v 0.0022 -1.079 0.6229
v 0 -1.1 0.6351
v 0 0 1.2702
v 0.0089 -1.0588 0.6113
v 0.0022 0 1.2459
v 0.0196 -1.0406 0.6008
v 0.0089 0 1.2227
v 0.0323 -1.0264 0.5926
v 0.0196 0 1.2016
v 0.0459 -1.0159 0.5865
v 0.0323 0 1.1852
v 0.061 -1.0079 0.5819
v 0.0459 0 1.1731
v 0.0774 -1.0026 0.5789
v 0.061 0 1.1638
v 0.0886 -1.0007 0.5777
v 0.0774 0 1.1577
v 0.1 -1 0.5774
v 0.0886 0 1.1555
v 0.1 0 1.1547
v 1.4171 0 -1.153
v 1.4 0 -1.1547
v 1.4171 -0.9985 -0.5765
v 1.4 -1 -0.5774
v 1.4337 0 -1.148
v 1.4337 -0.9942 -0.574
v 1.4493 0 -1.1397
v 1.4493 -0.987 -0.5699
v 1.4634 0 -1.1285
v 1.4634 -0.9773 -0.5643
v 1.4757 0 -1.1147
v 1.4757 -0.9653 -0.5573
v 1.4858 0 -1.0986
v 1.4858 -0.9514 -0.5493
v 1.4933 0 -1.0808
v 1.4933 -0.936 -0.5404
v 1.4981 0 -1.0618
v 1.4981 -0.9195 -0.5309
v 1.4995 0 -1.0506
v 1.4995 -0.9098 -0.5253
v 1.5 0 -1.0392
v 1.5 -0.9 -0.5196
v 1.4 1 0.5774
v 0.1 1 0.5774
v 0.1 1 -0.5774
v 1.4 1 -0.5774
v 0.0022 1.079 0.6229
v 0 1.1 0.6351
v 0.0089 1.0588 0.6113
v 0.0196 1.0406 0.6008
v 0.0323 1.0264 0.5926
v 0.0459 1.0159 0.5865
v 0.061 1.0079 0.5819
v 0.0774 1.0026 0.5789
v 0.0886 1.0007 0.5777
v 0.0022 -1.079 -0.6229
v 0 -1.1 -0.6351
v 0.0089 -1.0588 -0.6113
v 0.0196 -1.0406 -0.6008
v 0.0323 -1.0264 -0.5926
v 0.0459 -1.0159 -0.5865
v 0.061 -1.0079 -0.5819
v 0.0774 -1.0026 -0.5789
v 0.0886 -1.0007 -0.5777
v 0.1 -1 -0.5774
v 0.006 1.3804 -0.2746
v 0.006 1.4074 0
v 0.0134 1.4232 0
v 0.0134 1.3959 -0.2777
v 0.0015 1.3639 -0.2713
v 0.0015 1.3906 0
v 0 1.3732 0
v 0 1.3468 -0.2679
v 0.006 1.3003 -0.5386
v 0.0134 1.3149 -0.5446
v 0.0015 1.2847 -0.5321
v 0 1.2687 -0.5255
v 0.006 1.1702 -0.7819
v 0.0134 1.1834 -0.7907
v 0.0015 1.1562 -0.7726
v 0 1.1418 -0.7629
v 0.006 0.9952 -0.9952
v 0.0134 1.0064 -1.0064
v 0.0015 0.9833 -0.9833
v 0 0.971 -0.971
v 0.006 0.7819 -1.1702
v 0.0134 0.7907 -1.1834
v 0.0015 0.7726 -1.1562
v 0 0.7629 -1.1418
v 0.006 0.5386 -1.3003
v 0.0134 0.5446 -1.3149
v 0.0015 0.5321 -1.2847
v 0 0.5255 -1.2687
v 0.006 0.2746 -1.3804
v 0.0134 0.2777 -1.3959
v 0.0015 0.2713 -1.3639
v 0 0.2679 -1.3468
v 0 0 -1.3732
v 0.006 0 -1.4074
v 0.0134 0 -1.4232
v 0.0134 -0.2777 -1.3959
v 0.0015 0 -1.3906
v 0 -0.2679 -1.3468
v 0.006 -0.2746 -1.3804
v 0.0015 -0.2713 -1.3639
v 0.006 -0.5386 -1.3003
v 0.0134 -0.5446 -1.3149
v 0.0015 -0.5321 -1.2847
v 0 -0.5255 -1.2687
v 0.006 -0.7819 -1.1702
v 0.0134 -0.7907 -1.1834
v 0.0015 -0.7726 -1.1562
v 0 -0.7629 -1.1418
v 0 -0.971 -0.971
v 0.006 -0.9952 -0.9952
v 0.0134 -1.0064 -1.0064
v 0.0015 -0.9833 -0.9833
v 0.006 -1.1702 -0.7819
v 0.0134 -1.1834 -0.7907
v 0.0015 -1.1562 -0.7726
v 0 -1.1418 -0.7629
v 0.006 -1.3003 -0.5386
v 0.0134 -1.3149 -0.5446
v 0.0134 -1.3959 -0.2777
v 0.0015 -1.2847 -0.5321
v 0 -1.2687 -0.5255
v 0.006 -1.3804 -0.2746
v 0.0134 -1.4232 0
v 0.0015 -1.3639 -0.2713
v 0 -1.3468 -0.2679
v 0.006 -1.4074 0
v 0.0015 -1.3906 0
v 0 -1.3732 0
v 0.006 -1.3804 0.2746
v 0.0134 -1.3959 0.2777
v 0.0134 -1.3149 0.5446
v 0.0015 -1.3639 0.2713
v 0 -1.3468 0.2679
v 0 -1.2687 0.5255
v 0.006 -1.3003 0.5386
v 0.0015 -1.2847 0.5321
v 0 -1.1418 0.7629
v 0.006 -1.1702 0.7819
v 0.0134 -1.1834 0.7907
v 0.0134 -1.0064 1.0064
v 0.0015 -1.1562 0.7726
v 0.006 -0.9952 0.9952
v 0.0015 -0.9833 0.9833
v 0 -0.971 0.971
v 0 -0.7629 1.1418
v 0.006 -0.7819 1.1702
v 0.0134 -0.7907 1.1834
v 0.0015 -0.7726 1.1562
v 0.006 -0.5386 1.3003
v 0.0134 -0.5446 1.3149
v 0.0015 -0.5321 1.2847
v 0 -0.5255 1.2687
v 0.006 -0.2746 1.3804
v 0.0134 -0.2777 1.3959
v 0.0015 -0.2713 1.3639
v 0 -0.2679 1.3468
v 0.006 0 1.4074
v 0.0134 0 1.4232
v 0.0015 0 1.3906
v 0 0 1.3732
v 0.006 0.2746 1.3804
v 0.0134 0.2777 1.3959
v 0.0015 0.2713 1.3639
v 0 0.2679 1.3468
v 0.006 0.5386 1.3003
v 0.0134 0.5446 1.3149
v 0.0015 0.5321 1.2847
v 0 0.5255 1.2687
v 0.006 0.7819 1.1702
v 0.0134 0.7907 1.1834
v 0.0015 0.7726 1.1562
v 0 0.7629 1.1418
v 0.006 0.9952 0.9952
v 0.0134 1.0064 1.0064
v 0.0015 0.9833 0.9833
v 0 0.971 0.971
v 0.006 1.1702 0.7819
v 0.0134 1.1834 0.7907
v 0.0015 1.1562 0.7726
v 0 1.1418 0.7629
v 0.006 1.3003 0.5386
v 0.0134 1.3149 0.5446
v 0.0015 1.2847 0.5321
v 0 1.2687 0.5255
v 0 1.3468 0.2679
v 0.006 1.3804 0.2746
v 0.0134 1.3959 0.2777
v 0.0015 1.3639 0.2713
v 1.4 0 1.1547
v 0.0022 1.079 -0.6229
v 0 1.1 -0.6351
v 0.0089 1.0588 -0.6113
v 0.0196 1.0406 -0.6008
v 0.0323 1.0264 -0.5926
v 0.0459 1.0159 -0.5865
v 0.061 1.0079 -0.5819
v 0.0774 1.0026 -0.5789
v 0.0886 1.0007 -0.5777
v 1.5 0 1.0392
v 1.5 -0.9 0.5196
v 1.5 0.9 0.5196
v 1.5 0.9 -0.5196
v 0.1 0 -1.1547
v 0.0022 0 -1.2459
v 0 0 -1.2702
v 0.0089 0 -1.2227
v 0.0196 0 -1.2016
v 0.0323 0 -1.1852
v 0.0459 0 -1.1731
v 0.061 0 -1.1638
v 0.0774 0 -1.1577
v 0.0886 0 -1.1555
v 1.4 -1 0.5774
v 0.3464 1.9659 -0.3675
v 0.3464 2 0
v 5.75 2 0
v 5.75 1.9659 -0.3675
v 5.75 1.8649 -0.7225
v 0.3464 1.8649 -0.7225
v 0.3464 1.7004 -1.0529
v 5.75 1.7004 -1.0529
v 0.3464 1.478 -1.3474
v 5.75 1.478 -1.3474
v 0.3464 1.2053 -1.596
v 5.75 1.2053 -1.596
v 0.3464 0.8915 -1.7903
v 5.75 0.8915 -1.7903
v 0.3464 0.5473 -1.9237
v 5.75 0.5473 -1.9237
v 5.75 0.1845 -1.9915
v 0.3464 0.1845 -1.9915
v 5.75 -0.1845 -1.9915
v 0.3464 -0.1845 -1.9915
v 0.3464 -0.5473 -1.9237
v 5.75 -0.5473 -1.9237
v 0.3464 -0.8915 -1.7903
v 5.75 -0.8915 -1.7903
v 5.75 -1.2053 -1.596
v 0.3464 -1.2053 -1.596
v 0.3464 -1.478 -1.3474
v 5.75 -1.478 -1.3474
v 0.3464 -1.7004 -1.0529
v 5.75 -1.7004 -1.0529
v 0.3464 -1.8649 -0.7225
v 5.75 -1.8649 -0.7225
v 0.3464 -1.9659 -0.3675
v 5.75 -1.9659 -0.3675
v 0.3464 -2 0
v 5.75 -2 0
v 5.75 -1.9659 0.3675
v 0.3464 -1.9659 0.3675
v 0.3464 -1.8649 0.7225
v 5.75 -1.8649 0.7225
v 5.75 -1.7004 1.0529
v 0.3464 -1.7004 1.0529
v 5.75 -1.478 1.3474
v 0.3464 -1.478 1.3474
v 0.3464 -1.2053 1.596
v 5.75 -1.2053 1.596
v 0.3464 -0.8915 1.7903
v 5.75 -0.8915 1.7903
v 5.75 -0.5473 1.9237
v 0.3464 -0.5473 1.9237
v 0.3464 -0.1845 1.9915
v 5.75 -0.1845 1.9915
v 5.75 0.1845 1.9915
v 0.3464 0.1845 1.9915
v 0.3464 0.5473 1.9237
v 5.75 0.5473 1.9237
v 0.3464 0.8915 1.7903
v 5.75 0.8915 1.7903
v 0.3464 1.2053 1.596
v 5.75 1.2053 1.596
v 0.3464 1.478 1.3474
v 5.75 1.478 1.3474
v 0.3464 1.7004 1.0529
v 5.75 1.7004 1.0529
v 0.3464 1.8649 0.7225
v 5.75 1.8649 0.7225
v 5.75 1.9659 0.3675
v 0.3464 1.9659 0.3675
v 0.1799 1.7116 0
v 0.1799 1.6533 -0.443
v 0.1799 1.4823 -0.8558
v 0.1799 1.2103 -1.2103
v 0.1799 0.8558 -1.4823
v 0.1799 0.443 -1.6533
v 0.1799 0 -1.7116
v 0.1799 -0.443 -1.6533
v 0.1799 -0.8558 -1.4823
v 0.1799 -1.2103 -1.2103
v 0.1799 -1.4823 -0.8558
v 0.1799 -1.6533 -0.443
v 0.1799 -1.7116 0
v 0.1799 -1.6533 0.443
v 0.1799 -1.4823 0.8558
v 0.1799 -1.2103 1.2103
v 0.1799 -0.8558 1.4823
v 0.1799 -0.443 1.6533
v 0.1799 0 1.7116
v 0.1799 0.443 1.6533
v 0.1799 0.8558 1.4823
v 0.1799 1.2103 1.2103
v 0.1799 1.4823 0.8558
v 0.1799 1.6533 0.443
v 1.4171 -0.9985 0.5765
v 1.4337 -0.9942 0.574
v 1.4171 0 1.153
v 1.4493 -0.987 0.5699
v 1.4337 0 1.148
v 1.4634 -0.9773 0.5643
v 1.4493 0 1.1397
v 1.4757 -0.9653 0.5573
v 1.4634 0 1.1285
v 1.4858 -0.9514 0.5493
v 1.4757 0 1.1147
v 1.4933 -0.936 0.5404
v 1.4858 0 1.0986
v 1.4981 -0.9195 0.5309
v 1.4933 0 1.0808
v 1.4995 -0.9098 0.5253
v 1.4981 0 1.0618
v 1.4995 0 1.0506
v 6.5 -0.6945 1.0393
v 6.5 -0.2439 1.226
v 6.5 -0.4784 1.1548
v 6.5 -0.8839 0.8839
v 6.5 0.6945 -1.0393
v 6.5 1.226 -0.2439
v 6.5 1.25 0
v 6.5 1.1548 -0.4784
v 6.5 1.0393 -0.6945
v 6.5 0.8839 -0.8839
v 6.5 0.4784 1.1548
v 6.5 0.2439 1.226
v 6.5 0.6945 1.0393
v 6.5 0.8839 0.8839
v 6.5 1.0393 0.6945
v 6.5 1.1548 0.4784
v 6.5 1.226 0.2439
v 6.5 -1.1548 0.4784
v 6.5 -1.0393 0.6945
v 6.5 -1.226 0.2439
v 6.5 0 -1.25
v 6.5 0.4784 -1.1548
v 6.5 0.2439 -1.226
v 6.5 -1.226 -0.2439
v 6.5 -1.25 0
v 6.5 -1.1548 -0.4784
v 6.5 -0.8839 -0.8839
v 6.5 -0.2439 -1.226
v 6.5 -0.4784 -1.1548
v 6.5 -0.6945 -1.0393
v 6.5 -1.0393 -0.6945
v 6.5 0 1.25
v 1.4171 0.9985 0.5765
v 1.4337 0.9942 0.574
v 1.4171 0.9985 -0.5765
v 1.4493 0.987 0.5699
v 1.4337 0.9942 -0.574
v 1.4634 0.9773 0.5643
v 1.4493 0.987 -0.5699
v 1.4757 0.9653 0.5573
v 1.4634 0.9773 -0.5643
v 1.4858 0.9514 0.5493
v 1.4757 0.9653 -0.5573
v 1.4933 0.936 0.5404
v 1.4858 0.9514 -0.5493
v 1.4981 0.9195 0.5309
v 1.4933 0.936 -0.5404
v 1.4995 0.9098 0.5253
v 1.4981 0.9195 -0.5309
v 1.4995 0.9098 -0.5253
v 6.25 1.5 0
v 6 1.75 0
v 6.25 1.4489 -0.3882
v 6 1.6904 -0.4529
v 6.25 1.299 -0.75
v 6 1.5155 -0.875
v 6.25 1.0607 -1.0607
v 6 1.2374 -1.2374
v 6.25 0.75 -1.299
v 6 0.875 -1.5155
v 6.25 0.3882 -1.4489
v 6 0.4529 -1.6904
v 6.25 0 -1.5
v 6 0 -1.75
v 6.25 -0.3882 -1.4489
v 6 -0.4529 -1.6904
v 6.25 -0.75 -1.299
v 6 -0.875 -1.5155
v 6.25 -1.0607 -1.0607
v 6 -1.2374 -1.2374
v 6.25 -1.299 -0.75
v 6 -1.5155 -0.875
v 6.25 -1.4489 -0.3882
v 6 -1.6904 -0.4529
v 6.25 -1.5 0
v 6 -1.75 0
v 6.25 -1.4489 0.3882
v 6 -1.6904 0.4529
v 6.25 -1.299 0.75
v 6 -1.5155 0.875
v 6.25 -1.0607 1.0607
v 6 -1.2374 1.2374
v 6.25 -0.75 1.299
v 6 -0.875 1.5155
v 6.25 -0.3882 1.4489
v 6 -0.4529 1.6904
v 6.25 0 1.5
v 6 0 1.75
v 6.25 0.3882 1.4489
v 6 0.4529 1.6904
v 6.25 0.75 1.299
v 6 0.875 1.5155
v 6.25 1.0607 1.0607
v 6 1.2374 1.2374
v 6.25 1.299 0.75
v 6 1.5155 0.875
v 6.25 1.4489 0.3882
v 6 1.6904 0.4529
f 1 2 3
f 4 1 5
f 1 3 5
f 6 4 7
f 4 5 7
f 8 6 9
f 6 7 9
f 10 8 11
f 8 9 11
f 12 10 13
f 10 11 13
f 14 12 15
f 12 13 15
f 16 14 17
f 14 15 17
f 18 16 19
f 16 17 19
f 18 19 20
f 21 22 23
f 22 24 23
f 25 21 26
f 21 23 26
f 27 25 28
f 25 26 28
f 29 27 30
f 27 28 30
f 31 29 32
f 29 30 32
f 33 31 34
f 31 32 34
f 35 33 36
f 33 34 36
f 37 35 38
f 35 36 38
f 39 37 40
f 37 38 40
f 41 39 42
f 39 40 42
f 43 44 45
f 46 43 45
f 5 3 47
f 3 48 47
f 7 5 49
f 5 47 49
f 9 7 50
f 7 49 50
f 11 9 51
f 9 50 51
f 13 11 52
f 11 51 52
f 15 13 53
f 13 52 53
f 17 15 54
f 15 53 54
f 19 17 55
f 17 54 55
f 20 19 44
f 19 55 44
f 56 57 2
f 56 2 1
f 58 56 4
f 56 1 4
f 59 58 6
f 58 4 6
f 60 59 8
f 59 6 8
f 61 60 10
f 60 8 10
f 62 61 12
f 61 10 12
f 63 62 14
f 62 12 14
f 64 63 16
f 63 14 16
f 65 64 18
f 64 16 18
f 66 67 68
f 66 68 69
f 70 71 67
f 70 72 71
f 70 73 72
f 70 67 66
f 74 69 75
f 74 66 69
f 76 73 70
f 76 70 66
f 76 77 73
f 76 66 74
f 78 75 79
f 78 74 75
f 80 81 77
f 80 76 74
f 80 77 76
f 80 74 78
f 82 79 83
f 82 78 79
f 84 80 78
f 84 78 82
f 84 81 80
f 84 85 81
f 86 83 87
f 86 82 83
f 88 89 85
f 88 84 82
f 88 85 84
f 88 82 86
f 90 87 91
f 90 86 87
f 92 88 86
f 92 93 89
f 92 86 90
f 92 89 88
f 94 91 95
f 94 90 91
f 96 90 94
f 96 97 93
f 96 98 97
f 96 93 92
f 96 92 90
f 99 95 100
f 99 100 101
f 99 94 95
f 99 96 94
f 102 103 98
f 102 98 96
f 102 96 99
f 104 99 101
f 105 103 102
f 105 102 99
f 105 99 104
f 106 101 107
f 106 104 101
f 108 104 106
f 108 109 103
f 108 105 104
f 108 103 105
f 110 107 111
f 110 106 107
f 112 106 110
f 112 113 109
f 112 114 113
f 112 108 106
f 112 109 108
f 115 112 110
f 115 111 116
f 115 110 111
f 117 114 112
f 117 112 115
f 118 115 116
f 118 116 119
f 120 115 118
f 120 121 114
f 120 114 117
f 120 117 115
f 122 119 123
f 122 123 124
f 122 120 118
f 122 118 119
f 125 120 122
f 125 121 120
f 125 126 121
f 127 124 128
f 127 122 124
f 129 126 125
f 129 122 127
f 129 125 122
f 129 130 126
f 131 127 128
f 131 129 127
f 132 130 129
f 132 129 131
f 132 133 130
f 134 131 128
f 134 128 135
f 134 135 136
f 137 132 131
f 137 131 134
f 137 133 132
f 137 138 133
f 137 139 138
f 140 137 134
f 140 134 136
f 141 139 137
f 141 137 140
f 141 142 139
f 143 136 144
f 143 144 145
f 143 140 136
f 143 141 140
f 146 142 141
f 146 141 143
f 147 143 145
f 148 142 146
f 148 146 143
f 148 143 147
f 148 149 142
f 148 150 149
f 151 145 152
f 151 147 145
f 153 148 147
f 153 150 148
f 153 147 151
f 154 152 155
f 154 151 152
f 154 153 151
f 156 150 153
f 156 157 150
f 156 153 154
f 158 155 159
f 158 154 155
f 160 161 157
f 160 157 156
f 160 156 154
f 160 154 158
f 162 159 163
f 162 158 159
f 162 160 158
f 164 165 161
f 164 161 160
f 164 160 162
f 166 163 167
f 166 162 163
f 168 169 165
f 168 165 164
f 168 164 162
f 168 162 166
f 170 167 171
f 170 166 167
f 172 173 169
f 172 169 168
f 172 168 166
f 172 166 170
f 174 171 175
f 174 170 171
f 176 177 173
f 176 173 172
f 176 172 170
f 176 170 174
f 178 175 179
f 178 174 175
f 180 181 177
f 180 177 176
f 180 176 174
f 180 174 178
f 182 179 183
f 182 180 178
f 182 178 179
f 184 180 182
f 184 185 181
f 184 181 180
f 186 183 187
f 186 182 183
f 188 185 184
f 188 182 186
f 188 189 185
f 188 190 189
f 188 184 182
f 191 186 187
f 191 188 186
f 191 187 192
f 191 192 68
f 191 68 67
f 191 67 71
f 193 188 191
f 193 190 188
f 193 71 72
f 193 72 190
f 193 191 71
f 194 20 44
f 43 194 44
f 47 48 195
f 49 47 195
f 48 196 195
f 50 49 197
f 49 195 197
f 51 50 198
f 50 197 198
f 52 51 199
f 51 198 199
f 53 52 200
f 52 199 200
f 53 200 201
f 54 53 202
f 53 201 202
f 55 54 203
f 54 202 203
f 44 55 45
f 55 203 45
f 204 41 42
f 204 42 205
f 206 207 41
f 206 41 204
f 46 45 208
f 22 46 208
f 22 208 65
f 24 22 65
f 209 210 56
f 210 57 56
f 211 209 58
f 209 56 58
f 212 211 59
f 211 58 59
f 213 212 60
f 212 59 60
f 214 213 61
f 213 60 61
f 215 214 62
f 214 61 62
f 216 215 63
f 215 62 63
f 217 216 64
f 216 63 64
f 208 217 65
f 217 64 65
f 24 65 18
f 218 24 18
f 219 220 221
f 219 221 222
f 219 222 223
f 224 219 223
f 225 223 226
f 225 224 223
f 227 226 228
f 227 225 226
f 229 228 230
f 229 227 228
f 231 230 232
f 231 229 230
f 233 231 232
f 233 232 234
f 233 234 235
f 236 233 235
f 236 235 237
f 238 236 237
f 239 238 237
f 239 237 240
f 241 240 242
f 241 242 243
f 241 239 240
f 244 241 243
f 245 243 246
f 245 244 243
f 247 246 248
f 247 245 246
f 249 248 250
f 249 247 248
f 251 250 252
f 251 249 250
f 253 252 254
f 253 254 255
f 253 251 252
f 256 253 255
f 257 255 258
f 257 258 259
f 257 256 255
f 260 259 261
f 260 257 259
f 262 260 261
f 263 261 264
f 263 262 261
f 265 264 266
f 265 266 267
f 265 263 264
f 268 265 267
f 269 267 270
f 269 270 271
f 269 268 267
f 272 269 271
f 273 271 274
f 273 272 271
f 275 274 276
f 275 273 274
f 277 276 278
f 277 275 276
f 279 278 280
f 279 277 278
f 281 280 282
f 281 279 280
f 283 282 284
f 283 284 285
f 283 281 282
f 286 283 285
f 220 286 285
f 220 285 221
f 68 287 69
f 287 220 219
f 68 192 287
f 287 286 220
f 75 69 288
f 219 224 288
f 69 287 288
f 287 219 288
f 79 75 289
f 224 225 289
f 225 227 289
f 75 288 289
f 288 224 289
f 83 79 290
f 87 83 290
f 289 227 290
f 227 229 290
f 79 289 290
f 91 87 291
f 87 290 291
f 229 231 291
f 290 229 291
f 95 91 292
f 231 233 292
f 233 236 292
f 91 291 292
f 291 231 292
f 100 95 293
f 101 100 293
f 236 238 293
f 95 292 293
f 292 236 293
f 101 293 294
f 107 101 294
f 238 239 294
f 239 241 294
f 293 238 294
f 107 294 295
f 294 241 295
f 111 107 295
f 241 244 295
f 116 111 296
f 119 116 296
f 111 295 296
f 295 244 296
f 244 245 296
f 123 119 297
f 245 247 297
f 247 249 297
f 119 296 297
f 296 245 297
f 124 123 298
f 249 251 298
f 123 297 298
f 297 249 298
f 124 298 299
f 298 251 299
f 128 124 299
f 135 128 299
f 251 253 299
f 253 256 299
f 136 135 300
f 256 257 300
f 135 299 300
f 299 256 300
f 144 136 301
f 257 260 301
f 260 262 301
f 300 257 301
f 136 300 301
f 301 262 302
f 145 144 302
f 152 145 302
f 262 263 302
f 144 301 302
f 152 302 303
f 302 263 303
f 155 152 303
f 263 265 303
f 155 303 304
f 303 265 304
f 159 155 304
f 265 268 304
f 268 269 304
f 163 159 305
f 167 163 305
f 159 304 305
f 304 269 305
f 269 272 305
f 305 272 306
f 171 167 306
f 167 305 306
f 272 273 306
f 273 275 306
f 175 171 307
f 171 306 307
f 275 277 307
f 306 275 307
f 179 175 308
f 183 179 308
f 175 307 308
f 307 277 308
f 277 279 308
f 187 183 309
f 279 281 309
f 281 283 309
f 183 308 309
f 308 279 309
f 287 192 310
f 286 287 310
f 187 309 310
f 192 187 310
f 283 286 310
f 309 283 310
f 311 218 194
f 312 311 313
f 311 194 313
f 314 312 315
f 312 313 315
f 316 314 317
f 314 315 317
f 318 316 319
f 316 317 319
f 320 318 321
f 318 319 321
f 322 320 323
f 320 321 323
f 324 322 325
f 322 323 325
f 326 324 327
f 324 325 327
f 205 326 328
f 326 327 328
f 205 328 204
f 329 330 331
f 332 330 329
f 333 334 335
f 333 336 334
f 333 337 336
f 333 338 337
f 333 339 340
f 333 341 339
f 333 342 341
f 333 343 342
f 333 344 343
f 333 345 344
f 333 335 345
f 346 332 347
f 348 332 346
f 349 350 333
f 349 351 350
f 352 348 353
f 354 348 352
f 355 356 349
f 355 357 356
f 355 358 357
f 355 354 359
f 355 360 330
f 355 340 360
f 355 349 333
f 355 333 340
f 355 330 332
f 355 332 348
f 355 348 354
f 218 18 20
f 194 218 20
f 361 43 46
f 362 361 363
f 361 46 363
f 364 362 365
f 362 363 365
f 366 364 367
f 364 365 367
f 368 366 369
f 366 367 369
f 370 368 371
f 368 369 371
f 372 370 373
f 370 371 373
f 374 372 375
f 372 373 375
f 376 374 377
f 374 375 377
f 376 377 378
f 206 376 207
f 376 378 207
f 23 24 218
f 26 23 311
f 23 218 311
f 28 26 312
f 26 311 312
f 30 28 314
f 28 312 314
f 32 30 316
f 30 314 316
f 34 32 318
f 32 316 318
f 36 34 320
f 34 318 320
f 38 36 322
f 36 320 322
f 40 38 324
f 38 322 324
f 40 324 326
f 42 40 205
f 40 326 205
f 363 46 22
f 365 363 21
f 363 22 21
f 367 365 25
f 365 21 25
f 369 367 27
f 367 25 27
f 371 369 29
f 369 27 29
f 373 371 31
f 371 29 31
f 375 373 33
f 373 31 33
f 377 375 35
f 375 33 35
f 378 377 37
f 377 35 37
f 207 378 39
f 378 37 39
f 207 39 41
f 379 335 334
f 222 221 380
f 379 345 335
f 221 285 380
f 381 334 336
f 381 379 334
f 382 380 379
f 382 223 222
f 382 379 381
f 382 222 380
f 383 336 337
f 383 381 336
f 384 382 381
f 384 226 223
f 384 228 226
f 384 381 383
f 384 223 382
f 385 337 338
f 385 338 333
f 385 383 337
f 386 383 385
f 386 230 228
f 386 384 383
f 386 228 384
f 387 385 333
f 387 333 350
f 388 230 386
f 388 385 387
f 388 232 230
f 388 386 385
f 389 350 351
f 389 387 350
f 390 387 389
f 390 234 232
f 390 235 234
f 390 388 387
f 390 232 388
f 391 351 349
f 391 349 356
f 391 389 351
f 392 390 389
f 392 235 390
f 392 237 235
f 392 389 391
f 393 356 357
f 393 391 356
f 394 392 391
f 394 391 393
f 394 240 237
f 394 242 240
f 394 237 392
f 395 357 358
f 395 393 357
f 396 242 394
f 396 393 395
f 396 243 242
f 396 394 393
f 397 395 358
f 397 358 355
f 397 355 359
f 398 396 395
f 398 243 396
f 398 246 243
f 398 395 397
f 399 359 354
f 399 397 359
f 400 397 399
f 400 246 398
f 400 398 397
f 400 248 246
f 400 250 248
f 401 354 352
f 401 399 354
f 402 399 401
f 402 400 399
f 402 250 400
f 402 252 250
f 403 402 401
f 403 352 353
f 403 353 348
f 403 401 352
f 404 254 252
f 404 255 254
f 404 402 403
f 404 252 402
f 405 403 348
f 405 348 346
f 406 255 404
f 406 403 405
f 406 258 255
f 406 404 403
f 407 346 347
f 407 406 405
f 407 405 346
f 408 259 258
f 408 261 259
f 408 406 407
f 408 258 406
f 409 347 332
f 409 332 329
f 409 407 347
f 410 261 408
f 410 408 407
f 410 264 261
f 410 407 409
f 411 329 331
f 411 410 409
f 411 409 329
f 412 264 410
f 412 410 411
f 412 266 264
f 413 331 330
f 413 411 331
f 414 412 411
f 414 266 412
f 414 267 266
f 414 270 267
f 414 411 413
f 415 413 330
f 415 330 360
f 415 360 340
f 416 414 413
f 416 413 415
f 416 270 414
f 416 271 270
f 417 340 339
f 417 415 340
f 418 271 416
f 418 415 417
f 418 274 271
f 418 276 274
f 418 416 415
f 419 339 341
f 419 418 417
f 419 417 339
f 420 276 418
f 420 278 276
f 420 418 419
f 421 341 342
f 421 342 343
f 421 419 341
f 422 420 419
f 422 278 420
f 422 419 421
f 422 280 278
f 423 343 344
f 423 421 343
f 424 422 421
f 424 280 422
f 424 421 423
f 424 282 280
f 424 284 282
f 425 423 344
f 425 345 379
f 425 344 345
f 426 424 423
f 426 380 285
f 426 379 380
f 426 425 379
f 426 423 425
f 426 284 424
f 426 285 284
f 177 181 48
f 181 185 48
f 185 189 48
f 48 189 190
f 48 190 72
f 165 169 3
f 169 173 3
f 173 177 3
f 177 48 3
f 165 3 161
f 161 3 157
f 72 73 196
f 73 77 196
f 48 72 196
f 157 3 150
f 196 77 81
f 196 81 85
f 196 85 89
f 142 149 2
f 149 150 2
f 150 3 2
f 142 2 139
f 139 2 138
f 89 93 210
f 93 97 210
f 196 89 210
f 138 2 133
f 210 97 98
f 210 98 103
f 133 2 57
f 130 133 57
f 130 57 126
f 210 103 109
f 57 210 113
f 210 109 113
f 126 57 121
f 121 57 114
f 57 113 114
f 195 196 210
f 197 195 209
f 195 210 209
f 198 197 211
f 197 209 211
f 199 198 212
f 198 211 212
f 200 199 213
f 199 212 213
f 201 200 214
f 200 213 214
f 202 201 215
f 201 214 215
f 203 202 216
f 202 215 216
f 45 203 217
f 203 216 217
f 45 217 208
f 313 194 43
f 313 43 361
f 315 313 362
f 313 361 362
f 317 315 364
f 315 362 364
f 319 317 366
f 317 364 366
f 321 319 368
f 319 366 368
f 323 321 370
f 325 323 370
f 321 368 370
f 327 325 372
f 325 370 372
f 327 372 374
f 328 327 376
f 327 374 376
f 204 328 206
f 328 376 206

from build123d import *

# Parameters (mm, degrees)
SKETCH_1_W          = 6.5
SKETCH_1_H          = 2
CUT_EXTRUDE_1_DEPTH = 1.5
CHAMFER_1_SIZE      = 0.75
CHAMFER_2_SIZE      = 0.6
CHAMFER_2_SIZE2     = 0.346410161
FILLET_1_R          = 0.1


with BuildPart() as part:
    # Эскиз1 → Повернуть1 (revolve)
    with BuildSketch(Plane(origin=(0, 0, 0), x_dir=(-1, 0, 0), z_dir=(0, 0, -1))):
        with Locations((-3.25, 1)):
            Rectangle(SKETCH_1_W, SKETCH_1_H)
    revolve(axis=Axis((6.5, 0, 0), (-1, 0, 0)))

    # Эскиз2 → Вырез-Вытянуть1 (cut)
    with BuildSketch(Plane.ZY):
        Polygon((1.154700538, 0), (0.577350269, 1), (-0.577350269, 1), (-1.154700538, 0), (-0.577350269, -1), (0.577350269, -1), align=None)
    extrude(amount=-CUT_EXTRUDE_1_DEPTH, mode=Mode.SUBTRACT)

    # Фаска1
    chamfer_1_edges = [part.edges().sort_by_distance(p)[0] for p in [
        (6.5, -2, 0),
    ]]
    chamfer(chamfer_1_edges, length=CHAMFER_1_SIZE)

    # Фаска2
    chamfer_2_edges = [part.edges().sort_by_distance(p)[0] for p in [
        (0, -2, 0),
    ]]
    chamfer_2_side = [part.faces().sort_by_distance(p)[0] for p in [
        (0, -1.943431458, 0),
    ]]
    chamfer(chamfer_2_edges, length=CHAMFER_2_SIZE, length2=CHAMFER_2_SIZE2, reference=chamfer_2_side[0])

    # Скругление1
    fillet_1_edges = [part.edges().sort_by_distance(p)[0] for p in [
        (1.5, -0.5, 0.866025404),
        (1.5, -1, 0),
        (1.5, -0.5, -0.866025404),
        (1.5, 0.5, -0.866025404),
        (1.5, 1, 0),
        (1.5, 0.5, 0.866025404),
        (0, -0.5, 0.866025404),
        (0, 0.5, 0.866025404),
        (0, 1, 0),
        (0, 0.5, -0.866025404),
        (0, -0.5, -0.866025404),
        (0, -1, 0),
        (0, -1.4, 0),
    ]]
    fillet(fillet_1_edges, radius=FILLET_1_R)


solid = part.part
